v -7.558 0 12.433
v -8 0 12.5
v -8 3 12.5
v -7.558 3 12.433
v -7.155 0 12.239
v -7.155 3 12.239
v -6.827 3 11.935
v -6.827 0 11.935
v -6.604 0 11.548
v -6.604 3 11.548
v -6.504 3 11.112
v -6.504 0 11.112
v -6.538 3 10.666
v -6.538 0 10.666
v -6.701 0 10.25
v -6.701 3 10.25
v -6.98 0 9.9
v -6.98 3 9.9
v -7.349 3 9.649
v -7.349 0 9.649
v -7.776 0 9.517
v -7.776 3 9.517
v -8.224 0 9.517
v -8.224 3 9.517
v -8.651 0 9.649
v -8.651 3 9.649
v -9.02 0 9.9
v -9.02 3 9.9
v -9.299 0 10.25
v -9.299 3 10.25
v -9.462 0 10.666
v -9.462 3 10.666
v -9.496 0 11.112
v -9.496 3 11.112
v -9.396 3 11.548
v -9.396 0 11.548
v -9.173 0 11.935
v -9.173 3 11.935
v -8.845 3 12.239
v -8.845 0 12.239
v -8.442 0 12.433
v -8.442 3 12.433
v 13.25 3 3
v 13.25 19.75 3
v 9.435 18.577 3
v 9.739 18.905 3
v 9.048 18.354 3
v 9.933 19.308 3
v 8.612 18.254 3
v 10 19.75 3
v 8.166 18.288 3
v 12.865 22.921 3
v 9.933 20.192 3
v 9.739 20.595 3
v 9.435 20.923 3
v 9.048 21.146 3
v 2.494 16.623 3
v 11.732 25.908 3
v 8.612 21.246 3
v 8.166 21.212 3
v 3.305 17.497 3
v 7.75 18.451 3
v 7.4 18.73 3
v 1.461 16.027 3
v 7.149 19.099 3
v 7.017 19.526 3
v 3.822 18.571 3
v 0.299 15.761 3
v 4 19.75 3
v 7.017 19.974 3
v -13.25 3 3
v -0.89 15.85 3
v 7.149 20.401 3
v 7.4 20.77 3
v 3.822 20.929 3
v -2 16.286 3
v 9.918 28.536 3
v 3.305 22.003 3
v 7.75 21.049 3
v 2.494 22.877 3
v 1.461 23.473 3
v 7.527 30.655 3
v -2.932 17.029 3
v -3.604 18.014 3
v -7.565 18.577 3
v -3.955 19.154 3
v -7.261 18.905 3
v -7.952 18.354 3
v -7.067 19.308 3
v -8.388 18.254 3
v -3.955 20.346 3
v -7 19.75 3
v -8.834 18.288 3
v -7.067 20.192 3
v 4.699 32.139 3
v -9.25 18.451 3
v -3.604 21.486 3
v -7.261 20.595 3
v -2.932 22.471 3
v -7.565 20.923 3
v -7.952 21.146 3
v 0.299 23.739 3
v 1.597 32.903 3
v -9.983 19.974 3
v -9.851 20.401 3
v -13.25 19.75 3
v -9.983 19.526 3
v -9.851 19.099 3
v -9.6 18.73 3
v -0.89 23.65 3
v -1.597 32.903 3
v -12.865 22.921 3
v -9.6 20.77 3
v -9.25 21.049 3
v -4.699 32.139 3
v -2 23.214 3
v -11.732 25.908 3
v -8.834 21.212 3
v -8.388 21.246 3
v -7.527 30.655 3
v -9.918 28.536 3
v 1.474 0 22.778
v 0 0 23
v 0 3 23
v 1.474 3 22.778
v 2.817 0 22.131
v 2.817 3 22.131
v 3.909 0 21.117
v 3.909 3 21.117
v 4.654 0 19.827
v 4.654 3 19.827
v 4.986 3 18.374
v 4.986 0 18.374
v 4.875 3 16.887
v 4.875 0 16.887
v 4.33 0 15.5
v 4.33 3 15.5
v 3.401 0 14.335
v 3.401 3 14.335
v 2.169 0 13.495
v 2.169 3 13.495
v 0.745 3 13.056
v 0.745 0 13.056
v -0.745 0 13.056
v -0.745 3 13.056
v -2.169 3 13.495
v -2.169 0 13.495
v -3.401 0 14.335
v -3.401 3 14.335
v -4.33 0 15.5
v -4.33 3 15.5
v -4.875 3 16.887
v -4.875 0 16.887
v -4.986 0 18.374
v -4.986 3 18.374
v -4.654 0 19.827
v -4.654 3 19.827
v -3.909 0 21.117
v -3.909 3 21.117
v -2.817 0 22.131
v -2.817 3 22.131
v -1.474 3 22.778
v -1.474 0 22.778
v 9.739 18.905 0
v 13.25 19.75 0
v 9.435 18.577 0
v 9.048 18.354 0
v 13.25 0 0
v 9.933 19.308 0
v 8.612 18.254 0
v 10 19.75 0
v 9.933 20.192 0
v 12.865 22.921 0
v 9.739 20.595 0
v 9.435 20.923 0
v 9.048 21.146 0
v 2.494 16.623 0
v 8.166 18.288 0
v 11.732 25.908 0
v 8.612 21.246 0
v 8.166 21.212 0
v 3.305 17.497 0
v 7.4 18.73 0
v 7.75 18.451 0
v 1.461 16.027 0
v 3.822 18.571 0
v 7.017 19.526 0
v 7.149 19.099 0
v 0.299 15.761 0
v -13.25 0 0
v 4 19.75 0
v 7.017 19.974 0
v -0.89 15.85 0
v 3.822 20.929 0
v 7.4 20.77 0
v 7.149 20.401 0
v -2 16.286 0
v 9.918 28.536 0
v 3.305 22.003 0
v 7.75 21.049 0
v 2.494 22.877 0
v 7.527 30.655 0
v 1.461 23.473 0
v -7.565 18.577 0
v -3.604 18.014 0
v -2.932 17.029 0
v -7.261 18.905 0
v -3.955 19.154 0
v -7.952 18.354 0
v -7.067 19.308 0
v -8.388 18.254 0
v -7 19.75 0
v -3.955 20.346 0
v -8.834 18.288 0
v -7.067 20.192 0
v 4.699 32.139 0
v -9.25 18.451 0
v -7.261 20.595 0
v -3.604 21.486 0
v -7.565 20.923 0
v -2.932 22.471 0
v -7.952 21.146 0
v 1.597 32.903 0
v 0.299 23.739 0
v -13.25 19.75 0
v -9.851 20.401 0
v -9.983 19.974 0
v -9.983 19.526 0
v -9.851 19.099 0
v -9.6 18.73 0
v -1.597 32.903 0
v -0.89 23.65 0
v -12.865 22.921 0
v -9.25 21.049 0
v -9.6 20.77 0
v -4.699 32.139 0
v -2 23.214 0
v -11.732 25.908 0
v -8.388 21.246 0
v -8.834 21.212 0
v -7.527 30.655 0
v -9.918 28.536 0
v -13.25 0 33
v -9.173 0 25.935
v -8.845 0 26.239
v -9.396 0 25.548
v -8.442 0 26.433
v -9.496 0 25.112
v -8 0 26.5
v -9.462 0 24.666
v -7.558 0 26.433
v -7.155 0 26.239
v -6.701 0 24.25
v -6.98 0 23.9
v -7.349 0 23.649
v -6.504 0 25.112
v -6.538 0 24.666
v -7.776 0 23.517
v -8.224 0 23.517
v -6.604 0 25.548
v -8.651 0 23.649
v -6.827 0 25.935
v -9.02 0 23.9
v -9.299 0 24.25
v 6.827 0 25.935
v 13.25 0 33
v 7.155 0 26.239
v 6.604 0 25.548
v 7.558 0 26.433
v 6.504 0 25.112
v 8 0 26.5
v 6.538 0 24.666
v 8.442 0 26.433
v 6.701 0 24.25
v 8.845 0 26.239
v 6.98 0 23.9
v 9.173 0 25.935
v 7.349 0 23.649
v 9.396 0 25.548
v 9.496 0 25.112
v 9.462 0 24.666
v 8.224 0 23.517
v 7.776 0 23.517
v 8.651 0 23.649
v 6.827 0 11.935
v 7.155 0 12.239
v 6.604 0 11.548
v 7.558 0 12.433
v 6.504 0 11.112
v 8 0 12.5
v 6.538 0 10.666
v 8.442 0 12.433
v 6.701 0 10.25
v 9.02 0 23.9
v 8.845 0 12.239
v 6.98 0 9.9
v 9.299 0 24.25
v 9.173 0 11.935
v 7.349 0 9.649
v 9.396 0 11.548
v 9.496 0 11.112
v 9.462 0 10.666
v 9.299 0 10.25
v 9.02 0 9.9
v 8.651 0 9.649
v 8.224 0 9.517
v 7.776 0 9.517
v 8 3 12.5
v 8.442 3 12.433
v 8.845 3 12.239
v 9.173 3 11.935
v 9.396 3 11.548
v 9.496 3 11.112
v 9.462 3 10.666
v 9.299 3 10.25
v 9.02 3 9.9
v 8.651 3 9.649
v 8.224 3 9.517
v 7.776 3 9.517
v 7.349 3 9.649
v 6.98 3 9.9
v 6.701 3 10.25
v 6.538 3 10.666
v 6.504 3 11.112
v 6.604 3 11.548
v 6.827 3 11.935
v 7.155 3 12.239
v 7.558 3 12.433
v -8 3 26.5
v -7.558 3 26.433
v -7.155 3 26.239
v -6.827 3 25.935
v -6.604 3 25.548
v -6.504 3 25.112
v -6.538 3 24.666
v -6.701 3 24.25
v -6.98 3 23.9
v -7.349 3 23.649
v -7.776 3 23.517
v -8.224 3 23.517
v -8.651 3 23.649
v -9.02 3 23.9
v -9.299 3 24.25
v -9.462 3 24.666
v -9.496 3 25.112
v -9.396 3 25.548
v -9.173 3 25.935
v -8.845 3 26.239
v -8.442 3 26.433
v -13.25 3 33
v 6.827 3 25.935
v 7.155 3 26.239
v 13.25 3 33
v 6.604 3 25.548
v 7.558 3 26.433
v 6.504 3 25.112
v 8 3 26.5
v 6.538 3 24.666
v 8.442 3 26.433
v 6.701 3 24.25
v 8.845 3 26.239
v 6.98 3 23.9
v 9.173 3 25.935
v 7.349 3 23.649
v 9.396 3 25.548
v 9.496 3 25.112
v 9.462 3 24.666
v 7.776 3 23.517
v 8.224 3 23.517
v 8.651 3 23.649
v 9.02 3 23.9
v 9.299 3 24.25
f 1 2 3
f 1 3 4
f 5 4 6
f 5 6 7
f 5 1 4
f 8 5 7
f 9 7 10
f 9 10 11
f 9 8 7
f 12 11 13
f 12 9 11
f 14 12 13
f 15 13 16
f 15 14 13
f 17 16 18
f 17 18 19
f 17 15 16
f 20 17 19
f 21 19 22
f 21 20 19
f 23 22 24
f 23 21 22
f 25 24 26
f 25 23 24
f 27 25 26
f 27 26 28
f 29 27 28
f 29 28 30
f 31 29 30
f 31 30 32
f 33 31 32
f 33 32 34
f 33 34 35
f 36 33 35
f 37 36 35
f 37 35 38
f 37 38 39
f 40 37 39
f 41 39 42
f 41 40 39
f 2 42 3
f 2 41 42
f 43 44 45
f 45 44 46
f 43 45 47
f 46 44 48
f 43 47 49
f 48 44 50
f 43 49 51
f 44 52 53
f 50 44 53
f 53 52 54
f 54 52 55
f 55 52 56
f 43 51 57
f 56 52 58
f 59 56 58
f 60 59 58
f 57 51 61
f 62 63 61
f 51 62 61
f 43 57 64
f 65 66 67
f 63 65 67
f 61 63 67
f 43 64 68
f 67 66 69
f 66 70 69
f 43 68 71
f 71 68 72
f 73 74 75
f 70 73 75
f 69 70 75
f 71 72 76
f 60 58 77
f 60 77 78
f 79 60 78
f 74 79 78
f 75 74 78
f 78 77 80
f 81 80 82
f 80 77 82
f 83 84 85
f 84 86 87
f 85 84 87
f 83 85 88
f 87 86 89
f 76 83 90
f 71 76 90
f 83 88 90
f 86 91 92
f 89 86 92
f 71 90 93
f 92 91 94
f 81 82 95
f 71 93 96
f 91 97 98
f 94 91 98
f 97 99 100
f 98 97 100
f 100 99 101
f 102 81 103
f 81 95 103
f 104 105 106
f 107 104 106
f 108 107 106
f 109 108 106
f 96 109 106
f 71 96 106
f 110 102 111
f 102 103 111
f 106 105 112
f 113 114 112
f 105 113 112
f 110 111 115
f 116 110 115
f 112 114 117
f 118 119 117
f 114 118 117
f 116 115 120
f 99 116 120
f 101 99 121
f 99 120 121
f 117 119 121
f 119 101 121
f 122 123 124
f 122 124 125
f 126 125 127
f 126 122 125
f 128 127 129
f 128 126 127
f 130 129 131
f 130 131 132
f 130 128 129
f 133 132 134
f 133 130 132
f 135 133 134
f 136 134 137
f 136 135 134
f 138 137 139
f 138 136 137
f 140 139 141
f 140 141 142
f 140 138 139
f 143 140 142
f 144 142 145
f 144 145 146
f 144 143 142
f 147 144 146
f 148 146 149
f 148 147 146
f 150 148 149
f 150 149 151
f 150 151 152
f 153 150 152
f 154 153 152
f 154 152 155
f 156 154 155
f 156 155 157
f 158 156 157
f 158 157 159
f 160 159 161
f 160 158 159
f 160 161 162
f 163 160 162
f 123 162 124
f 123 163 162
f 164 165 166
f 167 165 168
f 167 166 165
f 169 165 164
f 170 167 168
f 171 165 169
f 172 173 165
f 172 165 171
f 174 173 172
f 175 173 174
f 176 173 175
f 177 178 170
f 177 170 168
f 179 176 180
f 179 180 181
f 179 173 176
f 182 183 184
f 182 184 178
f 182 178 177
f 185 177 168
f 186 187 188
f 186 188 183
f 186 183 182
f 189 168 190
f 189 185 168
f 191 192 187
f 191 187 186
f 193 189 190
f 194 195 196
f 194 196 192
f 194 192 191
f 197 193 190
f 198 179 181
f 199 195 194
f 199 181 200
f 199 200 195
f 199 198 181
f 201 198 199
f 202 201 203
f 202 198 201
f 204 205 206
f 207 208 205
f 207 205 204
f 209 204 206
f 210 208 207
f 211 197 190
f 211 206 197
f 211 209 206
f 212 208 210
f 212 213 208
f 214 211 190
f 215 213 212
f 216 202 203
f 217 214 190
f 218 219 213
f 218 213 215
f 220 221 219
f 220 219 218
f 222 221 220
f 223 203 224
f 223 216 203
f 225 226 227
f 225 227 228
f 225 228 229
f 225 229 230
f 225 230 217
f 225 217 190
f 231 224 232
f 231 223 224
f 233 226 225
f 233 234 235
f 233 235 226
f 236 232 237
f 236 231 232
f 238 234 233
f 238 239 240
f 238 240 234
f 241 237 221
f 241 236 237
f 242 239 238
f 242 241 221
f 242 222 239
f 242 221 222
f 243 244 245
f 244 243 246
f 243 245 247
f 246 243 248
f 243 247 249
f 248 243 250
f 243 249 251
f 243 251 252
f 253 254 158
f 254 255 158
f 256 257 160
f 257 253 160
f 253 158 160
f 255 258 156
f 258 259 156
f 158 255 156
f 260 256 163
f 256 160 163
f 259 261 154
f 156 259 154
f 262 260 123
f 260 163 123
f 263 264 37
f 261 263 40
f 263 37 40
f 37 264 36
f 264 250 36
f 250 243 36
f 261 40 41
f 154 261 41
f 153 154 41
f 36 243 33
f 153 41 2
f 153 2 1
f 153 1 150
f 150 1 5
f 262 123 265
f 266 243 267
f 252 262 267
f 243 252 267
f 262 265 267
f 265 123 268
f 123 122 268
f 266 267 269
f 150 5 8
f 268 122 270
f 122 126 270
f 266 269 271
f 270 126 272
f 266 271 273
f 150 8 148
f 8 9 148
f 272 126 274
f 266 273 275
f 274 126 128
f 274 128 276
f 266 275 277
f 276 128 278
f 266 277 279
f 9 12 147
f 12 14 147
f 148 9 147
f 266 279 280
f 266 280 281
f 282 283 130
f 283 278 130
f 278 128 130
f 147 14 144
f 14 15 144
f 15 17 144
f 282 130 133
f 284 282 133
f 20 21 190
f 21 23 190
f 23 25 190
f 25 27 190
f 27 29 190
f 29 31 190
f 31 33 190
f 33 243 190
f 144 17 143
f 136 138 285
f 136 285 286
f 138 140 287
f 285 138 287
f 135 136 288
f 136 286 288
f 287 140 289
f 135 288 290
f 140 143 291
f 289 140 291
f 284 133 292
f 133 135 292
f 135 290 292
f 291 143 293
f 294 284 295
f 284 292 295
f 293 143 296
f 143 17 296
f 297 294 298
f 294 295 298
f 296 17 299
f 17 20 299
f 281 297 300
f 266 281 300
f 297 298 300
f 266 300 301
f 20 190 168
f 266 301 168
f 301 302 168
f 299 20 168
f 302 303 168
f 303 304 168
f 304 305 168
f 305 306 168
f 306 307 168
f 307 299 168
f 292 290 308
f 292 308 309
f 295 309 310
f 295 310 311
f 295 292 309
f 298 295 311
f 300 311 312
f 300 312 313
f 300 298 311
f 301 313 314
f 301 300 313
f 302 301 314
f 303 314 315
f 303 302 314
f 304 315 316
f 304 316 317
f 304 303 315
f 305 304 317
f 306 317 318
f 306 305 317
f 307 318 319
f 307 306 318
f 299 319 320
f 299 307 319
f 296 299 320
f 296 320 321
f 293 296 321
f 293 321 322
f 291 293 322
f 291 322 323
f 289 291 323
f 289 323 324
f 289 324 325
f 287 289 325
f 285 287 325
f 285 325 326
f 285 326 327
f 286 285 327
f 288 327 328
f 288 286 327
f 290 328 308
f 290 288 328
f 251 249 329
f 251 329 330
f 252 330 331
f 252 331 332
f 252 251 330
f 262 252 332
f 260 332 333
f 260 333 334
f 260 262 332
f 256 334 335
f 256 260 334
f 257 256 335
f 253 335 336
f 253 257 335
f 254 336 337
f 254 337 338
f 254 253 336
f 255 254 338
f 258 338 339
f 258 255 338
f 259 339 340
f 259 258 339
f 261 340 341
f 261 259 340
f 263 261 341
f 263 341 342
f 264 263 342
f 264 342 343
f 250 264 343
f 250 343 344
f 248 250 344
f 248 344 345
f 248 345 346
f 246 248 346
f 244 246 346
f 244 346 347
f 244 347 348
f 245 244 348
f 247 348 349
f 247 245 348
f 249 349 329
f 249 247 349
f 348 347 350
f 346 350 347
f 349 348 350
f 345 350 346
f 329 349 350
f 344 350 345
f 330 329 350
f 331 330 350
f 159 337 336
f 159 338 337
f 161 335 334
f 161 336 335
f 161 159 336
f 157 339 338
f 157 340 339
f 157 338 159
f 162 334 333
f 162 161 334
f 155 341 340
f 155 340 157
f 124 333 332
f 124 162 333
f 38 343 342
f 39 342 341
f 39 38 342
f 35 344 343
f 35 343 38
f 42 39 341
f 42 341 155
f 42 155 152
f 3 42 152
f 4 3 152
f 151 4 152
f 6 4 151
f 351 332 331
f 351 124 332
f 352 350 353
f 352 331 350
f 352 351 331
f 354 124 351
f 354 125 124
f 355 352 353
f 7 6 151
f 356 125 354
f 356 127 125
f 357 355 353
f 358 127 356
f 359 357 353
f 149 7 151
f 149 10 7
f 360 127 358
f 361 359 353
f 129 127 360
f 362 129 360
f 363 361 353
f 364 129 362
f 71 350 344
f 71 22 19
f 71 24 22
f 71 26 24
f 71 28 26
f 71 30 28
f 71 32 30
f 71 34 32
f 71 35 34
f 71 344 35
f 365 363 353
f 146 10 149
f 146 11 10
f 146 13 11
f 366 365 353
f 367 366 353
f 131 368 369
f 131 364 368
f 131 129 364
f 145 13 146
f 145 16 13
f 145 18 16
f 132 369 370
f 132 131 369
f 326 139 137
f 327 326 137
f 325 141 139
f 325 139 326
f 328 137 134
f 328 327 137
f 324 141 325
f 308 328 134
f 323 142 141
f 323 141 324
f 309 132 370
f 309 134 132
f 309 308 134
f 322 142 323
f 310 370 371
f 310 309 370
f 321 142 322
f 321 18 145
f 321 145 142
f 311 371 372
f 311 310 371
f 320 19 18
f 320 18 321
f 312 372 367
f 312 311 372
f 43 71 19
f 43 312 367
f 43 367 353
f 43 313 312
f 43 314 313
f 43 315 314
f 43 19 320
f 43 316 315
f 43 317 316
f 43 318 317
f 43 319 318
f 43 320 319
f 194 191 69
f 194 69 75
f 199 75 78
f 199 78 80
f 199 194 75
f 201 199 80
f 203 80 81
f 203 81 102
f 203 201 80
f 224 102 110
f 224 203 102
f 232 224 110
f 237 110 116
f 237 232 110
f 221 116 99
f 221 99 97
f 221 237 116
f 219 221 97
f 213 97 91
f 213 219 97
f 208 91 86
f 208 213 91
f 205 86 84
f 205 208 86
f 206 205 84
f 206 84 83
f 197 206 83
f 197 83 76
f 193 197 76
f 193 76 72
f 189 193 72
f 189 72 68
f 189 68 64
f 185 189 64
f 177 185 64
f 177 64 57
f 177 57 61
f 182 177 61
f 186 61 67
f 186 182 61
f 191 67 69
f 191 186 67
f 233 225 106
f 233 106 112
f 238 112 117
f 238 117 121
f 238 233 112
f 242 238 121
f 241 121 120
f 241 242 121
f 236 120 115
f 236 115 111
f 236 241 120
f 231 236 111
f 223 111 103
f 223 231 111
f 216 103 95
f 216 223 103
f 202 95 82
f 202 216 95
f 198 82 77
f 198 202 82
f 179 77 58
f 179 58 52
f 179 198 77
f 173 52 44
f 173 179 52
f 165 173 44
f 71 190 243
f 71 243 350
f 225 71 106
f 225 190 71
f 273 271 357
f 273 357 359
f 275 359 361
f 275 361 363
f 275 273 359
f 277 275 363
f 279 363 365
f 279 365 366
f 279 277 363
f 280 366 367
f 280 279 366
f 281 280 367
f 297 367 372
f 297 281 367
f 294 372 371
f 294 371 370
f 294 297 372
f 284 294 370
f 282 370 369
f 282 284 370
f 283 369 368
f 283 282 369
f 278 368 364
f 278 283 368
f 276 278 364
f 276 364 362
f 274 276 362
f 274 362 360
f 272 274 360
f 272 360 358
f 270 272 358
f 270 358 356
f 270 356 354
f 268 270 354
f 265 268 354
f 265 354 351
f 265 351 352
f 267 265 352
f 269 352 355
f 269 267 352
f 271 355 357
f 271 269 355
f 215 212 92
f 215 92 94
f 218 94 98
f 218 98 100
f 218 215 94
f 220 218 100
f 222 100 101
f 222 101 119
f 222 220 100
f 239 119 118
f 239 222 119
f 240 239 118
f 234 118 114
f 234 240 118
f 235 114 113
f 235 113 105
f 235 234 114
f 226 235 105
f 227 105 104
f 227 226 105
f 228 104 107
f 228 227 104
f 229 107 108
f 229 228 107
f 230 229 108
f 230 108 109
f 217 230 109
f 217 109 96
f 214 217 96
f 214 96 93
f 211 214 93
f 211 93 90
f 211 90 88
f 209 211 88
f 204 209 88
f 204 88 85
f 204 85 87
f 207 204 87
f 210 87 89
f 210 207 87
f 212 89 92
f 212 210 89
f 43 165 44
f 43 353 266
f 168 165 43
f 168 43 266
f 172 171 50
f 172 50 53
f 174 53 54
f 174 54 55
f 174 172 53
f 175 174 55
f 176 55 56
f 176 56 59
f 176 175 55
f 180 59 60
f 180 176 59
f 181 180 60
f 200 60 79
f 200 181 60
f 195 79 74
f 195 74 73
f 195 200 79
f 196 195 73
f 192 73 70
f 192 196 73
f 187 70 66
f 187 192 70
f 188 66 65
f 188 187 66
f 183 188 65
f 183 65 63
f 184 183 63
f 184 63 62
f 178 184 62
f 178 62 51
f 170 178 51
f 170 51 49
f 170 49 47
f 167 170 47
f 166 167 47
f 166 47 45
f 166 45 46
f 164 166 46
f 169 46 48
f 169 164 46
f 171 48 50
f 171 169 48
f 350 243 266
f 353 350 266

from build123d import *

# Parameters (mm, degrees)
SKETCH_1_W      = 26.5
SKETCH_1_H      = 33
SKETCH_1_R      = 5
SKETCH_1_R_2    = 1.5
EXTRUDE_1_DEPTH = 3
SKETCH_2_R      = 4
SKETCH_2_R_2    = 1.5
EXTRUDE_2_DEPTH = 3


with BuildPart() as part:
    # 草图1 → 凸台-拉伸1 (new body)
    with BuildSketch(Plane(origin=(0, 0, 0), x_dir=(1, 0, 0), z_dir=(0, 1, 0))):
        with Locations((0, -16.5)):
            Rectangle(SKETCH_1_W, SKETCH_1_H)
        with Locations(Location((0, -18, 0), (0, 0, 270))):
            Circle(SKETCH_1_R, mode=Mode.SUBTRACT)
        with Locations(Location((-8, -11, 0), (0, 0, 270))):
            Circle(SKETCH_1_R_2, mode=Mode.SUBTRACT)
        with Locations(Location((8, -11, 0), (0, 0, 270))):
            Circle(SKETCH_1_R_2, mode=Mode.SUBTRACT)
        with Locations(Location((-8, -25, 0), (0, 0, 270))):
            Circle(SKETCH_1_R_2, mode=Mode.SUBTRACT)
        with Locations(Location((8, -25, 0), (0, 0, 270))):
            Circle(SKETCH_1_R_2, mode=Mode.SUBTRACT)
    extrude(amount=EXTRUDE_1_DEPTH)

    # 草图2 → 凸台-拉伸2 (add)
    with BuildSketch(Plane.XY):
        with BuildLine():
            Line((-13.25, 3), (-13.25, 19.75))
            ThreePointArc((-13.25, 19.75), (0, 33), (13.25, 19.75))
            Line((13.25, 19.75), (13.25, 3))
            Line((13.25, 3), (-13.25, 3))
        make_face()
        with Locations((0, 19.75)):
            Circle(SKETCH_2_R, mode=Mode.SUBTRACT)
        with Locations((-8.5, 19.75)):
            Circle(SKETCH_2_R_2, mode=Mode.SUBTRACT)
        with Locations((8.5, 19.75)):
            Circle(SKETCH_2_R_2, mode=Mode.SUBTRACT)
    extrude(amount=EXTRUDE_2_DEPTH)


solid = part.part
